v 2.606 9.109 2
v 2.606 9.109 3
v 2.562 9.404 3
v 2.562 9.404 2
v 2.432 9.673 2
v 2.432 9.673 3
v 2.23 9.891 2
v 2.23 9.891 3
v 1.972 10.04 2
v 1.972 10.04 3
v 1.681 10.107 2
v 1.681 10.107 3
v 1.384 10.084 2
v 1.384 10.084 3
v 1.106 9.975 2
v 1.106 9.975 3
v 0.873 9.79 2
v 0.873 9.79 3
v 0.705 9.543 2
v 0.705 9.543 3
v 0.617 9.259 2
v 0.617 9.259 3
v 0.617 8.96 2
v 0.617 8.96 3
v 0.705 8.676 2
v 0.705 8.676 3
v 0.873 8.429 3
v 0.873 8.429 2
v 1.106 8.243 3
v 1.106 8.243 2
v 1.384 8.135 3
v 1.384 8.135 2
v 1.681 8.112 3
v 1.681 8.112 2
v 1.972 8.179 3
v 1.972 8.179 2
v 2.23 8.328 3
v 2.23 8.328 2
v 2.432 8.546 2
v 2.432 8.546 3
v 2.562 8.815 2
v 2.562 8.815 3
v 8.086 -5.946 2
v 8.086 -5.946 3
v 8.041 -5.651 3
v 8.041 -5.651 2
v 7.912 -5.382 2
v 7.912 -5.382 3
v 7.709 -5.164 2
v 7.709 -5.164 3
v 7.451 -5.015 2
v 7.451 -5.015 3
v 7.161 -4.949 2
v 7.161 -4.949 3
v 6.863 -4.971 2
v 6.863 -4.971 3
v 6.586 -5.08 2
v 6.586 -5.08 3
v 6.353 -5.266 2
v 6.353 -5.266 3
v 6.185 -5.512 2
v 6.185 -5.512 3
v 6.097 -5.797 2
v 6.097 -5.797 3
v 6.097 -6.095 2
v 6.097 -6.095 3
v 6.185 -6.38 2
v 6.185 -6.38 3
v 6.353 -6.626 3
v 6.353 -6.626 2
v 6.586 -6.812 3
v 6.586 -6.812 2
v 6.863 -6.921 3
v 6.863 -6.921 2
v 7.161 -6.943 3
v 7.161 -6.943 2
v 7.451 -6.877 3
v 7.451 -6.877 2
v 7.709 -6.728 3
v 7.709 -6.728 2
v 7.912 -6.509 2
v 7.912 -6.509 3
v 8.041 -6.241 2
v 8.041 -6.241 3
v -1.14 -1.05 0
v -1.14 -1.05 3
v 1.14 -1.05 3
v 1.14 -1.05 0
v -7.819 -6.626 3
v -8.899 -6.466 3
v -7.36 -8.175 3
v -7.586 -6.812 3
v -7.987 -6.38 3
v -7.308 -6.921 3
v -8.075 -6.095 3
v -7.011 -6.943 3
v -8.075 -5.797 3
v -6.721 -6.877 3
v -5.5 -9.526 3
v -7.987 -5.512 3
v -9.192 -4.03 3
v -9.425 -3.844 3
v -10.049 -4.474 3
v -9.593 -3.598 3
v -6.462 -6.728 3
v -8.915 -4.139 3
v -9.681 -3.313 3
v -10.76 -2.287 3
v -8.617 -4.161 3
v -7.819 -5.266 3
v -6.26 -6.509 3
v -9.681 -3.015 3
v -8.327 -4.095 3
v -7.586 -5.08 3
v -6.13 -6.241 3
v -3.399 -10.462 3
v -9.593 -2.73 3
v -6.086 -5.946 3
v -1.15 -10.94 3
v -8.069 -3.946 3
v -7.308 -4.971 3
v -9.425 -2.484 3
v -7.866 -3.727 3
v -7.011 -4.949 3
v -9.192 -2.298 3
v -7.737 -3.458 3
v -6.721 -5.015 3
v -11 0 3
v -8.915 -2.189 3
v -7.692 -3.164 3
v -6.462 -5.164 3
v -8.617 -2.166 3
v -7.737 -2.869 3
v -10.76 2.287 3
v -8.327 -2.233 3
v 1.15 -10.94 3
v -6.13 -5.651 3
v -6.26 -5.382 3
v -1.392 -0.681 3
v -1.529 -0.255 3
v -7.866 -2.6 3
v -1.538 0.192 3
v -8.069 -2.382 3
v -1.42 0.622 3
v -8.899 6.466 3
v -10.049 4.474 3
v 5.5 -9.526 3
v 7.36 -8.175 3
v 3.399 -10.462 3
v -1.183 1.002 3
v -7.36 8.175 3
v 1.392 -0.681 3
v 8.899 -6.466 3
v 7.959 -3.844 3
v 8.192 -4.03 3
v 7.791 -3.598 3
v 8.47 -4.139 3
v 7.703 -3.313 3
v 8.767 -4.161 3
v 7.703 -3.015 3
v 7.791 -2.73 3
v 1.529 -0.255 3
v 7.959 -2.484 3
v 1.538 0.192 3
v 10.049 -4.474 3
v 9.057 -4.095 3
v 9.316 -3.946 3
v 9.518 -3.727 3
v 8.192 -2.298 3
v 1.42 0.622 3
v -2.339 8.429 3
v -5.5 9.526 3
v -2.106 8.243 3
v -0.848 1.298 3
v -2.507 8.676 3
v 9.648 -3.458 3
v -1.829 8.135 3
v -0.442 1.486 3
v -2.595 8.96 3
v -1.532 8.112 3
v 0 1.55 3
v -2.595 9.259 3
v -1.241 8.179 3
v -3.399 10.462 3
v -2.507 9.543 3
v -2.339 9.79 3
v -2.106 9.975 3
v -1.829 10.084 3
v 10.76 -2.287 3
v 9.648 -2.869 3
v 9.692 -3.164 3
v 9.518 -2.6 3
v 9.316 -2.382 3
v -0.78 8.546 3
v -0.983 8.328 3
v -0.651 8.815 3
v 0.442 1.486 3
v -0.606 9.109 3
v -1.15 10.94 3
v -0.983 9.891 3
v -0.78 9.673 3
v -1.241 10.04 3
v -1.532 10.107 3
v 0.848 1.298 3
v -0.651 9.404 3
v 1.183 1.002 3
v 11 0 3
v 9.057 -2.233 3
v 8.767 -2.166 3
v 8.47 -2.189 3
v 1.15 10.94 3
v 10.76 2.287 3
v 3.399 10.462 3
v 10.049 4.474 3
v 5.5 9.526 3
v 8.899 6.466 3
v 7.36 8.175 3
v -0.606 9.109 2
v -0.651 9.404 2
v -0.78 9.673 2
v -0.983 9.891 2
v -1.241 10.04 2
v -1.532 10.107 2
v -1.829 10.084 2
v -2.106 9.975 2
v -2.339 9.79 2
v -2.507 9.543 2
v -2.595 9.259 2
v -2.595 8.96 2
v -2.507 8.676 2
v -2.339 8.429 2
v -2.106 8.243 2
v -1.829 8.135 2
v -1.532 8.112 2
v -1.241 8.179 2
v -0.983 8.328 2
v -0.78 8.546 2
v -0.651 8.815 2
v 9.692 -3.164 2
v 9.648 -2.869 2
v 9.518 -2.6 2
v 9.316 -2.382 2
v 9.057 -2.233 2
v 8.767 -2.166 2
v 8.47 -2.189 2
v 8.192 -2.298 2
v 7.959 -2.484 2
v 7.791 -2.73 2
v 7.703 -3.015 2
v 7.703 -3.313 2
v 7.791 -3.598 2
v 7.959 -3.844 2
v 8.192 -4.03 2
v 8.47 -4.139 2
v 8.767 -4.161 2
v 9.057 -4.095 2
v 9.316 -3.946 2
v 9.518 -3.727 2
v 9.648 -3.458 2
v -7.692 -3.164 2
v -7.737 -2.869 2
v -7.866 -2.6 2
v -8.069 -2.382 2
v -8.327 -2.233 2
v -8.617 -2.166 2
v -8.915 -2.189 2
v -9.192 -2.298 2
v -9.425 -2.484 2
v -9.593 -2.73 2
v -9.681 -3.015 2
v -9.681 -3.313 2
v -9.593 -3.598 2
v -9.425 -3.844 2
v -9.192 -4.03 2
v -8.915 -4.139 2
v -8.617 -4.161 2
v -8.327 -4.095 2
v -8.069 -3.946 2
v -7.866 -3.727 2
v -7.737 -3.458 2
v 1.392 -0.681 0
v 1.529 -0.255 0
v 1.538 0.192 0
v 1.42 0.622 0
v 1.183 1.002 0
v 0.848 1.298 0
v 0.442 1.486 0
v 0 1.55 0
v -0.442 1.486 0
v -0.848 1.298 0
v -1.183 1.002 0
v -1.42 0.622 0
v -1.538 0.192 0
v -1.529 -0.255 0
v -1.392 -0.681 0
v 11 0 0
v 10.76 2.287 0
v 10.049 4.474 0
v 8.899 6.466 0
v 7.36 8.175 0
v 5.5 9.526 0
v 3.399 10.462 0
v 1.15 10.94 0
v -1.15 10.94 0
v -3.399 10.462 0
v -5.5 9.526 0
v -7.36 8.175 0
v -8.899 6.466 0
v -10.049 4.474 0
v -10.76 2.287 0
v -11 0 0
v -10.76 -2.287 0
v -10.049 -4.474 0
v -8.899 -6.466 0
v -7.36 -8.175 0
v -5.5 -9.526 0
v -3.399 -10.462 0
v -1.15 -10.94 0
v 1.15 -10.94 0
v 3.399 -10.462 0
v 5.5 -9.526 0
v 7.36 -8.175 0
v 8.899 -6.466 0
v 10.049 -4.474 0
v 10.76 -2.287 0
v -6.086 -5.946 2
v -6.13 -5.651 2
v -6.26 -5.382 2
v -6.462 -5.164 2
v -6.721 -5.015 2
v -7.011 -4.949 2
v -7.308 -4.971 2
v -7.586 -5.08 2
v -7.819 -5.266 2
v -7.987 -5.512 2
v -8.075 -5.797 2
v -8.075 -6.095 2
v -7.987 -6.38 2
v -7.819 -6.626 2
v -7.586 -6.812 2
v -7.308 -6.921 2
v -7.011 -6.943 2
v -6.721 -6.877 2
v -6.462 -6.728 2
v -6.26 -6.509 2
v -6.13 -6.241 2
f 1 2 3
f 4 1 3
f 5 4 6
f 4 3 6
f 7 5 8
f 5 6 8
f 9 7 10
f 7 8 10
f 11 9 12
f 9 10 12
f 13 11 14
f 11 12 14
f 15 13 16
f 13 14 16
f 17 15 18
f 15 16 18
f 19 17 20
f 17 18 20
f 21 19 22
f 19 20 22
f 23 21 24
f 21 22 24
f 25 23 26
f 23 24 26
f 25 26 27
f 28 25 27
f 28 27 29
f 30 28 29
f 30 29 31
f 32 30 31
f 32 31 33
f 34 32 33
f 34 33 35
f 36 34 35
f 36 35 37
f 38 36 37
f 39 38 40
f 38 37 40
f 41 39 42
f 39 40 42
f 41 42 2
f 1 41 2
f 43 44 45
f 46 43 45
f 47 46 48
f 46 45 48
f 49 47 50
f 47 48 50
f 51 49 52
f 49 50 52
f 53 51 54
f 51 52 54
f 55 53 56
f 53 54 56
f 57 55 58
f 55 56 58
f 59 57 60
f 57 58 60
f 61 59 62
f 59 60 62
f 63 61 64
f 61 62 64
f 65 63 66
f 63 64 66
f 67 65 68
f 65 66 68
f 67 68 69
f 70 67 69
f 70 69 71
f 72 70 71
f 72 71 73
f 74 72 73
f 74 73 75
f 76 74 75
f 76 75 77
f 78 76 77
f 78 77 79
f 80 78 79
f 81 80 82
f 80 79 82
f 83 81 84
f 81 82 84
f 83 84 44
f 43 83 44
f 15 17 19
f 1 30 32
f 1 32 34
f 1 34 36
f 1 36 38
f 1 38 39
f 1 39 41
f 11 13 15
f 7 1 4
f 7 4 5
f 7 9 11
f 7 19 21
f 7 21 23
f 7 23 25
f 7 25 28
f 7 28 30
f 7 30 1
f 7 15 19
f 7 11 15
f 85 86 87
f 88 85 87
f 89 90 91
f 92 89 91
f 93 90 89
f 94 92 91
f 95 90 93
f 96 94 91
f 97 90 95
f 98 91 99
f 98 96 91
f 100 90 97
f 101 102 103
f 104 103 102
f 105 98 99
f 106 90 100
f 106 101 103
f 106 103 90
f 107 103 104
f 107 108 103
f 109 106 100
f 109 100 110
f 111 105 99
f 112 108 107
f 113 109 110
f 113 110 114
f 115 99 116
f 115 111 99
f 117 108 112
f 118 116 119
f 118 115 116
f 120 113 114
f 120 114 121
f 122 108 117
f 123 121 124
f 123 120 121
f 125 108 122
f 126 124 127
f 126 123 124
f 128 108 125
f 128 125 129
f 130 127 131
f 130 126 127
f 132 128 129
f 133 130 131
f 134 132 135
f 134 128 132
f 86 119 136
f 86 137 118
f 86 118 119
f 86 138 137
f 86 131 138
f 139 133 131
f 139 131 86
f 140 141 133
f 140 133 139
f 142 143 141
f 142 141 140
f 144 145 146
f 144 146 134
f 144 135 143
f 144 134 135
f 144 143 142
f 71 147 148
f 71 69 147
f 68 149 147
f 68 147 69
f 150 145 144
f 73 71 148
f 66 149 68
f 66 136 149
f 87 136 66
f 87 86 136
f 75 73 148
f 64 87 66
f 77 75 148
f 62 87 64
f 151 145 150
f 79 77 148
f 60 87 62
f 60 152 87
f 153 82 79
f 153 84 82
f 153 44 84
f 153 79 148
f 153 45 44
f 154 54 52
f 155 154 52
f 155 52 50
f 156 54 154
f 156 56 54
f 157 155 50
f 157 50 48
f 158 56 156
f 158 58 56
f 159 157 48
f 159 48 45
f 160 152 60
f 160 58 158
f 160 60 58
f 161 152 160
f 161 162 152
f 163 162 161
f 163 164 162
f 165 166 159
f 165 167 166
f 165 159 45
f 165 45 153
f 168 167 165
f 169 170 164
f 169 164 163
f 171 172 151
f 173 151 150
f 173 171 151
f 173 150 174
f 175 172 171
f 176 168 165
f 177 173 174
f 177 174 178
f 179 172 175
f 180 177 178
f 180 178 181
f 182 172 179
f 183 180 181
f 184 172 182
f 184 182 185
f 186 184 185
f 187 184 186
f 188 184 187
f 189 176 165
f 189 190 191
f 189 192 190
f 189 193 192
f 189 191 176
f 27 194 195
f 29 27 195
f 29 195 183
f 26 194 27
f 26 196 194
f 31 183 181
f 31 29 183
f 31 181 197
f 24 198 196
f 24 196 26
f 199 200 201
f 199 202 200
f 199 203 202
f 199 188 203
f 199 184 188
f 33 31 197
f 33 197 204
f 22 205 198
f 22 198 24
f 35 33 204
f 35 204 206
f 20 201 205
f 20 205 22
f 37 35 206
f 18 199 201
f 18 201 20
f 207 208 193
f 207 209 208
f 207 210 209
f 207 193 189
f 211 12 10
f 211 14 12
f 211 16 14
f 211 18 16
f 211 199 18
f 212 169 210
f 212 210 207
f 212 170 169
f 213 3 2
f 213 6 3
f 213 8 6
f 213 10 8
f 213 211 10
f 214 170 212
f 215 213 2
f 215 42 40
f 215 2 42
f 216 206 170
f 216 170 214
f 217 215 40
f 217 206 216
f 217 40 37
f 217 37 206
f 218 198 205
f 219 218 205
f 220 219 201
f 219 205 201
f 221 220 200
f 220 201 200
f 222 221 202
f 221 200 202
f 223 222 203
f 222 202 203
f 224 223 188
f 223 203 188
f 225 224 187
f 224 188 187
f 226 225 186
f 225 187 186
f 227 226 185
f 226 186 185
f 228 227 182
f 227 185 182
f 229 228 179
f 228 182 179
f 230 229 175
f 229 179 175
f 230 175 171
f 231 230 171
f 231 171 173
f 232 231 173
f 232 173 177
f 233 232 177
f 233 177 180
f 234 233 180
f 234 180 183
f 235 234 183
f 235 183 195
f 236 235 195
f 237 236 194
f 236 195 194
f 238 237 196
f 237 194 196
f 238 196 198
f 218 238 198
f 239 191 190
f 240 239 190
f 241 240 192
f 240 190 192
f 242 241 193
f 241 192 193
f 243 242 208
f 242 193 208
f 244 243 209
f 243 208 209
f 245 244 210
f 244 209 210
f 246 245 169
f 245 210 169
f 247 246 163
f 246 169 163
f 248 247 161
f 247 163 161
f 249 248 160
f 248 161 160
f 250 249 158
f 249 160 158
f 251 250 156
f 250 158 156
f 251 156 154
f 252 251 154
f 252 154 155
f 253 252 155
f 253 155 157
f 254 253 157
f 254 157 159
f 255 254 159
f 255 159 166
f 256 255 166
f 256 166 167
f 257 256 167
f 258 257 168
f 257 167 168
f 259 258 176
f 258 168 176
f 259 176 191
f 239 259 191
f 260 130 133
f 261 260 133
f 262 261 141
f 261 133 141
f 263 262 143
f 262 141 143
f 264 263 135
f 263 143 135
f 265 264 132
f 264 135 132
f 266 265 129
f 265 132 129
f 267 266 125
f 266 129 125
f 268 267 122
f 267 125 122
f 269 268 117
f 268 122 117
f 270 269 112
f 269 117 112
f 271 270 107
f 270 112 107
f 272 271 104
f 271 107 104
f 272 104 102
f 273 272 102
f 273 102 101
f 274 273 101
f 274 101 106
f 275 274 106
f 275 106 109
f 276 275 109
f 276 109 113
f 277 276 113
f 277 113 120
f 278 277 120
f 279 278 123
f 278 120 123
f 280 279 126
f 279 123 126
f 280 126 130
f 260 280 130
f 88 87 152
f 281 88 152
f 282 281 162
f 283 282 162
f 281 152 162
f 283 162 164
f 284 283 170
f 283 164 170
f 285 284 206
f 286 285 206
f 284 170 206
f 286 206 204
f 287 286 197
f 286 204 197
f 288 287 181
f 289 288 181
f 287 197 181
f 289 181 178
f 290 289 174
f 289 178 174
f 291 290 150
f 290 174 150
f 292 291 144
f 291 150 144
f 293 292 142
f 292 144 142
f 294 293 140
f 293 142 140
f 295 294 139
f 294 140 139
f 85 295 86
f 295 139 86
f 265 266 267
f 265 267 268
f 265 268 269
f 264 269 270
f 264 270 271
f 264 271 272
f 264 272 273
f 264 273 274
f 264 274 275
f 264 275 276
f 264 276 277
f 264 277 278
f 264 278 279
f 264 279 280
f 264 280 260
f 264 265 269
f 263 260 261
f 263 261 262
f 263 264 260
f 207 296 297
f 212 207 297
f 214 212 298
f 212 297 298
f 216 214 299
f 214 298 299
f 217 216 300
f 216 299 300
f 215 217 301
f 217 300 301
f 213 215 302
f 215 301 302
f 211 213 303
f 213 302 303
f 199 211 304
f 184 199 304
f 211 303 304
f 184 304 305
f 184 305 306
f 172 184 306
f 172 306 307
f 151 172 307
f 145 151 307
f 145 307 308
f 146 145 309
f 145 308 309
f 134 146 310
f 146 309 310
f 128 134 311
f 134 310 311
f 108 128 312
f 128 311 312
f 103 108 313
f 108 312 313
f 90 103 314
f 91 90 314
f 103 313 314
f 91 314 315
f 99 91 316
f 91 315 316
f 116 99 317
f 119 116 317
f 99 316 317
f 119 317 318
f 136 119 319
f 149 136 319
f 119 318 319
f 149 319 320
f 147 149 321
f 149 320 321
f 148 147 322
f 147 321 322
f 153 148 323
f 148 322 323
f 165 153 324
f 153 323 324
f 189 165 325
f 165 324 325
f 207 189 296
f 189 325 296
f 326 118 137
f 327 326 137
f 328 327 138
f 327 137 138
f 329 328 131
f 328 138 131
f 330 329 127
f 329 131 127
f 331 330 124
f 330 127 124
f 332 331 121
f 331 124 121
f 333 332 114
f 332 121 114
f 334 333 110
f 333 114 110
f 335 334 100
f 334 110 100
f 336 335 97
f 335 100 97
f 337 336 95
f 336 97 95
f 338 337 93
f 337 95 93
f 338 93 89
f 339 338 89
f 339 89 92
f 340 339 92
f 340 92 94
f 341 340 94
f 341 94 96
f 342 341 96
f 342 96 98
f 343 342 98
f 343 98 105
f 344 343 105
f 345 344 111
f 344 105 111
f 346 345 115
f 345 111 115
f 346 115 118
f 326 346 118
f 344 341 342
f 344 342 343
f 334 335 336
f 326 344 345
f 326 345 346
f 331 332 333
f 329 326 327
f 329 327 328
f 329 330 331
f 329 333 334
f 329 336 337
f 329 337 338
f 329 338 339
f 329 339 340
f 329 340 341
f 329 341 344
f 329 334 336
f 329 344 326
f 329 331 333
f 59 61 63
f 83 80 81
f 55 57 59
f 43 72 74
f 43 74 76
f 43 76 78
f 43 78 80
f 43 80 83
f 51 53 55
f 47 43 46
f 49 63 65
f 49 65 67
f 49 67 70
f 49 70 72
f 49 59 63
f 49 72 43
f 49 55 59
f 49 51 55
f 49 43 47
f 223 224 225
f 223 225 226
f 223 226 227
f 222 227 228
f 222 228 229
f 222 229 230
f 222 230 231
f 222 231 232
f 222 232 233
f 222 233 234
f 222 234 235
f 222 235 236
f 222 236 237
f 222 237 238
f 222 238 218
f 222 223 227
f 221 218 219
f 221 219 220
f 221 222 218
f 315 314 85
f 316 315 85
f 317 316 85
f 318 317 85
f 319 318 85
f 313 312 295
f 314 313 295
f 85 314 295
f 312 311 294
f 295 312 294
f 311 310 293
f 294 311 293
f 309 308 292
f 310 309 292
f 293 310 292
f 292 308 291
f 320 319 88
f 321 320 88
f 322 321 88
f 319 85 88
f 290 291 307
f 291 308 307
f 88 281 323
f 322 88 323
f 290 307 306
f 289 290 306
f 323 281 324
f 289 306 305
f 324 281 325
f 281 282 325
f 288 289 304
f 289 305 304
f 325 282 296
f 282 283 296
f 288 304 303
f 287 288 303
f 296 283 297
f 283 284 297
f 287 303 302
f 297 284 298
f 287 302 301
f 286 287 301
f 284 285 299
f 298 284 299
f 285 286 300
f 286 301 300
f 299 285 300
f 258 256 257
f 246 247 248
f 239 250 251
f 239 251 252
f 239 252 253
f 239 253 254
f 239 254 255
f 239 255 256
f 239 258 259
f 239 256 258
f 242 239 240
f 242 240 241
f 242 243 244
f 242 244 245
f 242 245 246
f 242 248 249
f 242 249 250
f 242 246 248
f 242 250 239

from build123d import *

# Parameters (mm, degrees)
F0_R     = 11
F1_DEPTH = 3
F3_DEPTH = 3
F4_R     = 1
F5_DEPTH = 1


with BuildPart() as f1:
    # F0 (on Top) → F1 (new body)
    with BuildSketch(Plane.XY):
        Circle(F0_R)
    extrude(amount=F1_DEPTH)

    # F2 (on face) → F3 (cut)
    with BuildSketch(Plane.XY.offset(3)):
        with BuildLine():
            ThreePointArc((1.140175, -1.05), (0, 1.55), (-1.140175, -1.05))
            Line((-1.140175, -1.05), (1.140175, -1.05))
        make_face()
    extrude(amount=-F3_DEPTH, mode=Mode.SUBTRACT)

    # F4 (on face) → F5 (cut)
    with BuildSketch(Plane.XY.offset(3)):
        with Locations((-1.606246, 9.109472)):
            Circle(F4_R)
        with Locations((-7.085911, -5.945785)):
            Circle(F4_R)
        with Locations((1.606246, 9.109472)):
            Circle(F4_R)
        with Locations((-8.692157, -3.163686)):
            Circle(F4_R)
        with Locations((8.692157, -3.163686)):
            Circle(F4_R)
        with Locations((7.085911, -5.945785)):
            Circle(F4_R)
    extrude(amount=-F5_DEPTH, mode=Mode.SUBTRACT)


solid = f1.part
